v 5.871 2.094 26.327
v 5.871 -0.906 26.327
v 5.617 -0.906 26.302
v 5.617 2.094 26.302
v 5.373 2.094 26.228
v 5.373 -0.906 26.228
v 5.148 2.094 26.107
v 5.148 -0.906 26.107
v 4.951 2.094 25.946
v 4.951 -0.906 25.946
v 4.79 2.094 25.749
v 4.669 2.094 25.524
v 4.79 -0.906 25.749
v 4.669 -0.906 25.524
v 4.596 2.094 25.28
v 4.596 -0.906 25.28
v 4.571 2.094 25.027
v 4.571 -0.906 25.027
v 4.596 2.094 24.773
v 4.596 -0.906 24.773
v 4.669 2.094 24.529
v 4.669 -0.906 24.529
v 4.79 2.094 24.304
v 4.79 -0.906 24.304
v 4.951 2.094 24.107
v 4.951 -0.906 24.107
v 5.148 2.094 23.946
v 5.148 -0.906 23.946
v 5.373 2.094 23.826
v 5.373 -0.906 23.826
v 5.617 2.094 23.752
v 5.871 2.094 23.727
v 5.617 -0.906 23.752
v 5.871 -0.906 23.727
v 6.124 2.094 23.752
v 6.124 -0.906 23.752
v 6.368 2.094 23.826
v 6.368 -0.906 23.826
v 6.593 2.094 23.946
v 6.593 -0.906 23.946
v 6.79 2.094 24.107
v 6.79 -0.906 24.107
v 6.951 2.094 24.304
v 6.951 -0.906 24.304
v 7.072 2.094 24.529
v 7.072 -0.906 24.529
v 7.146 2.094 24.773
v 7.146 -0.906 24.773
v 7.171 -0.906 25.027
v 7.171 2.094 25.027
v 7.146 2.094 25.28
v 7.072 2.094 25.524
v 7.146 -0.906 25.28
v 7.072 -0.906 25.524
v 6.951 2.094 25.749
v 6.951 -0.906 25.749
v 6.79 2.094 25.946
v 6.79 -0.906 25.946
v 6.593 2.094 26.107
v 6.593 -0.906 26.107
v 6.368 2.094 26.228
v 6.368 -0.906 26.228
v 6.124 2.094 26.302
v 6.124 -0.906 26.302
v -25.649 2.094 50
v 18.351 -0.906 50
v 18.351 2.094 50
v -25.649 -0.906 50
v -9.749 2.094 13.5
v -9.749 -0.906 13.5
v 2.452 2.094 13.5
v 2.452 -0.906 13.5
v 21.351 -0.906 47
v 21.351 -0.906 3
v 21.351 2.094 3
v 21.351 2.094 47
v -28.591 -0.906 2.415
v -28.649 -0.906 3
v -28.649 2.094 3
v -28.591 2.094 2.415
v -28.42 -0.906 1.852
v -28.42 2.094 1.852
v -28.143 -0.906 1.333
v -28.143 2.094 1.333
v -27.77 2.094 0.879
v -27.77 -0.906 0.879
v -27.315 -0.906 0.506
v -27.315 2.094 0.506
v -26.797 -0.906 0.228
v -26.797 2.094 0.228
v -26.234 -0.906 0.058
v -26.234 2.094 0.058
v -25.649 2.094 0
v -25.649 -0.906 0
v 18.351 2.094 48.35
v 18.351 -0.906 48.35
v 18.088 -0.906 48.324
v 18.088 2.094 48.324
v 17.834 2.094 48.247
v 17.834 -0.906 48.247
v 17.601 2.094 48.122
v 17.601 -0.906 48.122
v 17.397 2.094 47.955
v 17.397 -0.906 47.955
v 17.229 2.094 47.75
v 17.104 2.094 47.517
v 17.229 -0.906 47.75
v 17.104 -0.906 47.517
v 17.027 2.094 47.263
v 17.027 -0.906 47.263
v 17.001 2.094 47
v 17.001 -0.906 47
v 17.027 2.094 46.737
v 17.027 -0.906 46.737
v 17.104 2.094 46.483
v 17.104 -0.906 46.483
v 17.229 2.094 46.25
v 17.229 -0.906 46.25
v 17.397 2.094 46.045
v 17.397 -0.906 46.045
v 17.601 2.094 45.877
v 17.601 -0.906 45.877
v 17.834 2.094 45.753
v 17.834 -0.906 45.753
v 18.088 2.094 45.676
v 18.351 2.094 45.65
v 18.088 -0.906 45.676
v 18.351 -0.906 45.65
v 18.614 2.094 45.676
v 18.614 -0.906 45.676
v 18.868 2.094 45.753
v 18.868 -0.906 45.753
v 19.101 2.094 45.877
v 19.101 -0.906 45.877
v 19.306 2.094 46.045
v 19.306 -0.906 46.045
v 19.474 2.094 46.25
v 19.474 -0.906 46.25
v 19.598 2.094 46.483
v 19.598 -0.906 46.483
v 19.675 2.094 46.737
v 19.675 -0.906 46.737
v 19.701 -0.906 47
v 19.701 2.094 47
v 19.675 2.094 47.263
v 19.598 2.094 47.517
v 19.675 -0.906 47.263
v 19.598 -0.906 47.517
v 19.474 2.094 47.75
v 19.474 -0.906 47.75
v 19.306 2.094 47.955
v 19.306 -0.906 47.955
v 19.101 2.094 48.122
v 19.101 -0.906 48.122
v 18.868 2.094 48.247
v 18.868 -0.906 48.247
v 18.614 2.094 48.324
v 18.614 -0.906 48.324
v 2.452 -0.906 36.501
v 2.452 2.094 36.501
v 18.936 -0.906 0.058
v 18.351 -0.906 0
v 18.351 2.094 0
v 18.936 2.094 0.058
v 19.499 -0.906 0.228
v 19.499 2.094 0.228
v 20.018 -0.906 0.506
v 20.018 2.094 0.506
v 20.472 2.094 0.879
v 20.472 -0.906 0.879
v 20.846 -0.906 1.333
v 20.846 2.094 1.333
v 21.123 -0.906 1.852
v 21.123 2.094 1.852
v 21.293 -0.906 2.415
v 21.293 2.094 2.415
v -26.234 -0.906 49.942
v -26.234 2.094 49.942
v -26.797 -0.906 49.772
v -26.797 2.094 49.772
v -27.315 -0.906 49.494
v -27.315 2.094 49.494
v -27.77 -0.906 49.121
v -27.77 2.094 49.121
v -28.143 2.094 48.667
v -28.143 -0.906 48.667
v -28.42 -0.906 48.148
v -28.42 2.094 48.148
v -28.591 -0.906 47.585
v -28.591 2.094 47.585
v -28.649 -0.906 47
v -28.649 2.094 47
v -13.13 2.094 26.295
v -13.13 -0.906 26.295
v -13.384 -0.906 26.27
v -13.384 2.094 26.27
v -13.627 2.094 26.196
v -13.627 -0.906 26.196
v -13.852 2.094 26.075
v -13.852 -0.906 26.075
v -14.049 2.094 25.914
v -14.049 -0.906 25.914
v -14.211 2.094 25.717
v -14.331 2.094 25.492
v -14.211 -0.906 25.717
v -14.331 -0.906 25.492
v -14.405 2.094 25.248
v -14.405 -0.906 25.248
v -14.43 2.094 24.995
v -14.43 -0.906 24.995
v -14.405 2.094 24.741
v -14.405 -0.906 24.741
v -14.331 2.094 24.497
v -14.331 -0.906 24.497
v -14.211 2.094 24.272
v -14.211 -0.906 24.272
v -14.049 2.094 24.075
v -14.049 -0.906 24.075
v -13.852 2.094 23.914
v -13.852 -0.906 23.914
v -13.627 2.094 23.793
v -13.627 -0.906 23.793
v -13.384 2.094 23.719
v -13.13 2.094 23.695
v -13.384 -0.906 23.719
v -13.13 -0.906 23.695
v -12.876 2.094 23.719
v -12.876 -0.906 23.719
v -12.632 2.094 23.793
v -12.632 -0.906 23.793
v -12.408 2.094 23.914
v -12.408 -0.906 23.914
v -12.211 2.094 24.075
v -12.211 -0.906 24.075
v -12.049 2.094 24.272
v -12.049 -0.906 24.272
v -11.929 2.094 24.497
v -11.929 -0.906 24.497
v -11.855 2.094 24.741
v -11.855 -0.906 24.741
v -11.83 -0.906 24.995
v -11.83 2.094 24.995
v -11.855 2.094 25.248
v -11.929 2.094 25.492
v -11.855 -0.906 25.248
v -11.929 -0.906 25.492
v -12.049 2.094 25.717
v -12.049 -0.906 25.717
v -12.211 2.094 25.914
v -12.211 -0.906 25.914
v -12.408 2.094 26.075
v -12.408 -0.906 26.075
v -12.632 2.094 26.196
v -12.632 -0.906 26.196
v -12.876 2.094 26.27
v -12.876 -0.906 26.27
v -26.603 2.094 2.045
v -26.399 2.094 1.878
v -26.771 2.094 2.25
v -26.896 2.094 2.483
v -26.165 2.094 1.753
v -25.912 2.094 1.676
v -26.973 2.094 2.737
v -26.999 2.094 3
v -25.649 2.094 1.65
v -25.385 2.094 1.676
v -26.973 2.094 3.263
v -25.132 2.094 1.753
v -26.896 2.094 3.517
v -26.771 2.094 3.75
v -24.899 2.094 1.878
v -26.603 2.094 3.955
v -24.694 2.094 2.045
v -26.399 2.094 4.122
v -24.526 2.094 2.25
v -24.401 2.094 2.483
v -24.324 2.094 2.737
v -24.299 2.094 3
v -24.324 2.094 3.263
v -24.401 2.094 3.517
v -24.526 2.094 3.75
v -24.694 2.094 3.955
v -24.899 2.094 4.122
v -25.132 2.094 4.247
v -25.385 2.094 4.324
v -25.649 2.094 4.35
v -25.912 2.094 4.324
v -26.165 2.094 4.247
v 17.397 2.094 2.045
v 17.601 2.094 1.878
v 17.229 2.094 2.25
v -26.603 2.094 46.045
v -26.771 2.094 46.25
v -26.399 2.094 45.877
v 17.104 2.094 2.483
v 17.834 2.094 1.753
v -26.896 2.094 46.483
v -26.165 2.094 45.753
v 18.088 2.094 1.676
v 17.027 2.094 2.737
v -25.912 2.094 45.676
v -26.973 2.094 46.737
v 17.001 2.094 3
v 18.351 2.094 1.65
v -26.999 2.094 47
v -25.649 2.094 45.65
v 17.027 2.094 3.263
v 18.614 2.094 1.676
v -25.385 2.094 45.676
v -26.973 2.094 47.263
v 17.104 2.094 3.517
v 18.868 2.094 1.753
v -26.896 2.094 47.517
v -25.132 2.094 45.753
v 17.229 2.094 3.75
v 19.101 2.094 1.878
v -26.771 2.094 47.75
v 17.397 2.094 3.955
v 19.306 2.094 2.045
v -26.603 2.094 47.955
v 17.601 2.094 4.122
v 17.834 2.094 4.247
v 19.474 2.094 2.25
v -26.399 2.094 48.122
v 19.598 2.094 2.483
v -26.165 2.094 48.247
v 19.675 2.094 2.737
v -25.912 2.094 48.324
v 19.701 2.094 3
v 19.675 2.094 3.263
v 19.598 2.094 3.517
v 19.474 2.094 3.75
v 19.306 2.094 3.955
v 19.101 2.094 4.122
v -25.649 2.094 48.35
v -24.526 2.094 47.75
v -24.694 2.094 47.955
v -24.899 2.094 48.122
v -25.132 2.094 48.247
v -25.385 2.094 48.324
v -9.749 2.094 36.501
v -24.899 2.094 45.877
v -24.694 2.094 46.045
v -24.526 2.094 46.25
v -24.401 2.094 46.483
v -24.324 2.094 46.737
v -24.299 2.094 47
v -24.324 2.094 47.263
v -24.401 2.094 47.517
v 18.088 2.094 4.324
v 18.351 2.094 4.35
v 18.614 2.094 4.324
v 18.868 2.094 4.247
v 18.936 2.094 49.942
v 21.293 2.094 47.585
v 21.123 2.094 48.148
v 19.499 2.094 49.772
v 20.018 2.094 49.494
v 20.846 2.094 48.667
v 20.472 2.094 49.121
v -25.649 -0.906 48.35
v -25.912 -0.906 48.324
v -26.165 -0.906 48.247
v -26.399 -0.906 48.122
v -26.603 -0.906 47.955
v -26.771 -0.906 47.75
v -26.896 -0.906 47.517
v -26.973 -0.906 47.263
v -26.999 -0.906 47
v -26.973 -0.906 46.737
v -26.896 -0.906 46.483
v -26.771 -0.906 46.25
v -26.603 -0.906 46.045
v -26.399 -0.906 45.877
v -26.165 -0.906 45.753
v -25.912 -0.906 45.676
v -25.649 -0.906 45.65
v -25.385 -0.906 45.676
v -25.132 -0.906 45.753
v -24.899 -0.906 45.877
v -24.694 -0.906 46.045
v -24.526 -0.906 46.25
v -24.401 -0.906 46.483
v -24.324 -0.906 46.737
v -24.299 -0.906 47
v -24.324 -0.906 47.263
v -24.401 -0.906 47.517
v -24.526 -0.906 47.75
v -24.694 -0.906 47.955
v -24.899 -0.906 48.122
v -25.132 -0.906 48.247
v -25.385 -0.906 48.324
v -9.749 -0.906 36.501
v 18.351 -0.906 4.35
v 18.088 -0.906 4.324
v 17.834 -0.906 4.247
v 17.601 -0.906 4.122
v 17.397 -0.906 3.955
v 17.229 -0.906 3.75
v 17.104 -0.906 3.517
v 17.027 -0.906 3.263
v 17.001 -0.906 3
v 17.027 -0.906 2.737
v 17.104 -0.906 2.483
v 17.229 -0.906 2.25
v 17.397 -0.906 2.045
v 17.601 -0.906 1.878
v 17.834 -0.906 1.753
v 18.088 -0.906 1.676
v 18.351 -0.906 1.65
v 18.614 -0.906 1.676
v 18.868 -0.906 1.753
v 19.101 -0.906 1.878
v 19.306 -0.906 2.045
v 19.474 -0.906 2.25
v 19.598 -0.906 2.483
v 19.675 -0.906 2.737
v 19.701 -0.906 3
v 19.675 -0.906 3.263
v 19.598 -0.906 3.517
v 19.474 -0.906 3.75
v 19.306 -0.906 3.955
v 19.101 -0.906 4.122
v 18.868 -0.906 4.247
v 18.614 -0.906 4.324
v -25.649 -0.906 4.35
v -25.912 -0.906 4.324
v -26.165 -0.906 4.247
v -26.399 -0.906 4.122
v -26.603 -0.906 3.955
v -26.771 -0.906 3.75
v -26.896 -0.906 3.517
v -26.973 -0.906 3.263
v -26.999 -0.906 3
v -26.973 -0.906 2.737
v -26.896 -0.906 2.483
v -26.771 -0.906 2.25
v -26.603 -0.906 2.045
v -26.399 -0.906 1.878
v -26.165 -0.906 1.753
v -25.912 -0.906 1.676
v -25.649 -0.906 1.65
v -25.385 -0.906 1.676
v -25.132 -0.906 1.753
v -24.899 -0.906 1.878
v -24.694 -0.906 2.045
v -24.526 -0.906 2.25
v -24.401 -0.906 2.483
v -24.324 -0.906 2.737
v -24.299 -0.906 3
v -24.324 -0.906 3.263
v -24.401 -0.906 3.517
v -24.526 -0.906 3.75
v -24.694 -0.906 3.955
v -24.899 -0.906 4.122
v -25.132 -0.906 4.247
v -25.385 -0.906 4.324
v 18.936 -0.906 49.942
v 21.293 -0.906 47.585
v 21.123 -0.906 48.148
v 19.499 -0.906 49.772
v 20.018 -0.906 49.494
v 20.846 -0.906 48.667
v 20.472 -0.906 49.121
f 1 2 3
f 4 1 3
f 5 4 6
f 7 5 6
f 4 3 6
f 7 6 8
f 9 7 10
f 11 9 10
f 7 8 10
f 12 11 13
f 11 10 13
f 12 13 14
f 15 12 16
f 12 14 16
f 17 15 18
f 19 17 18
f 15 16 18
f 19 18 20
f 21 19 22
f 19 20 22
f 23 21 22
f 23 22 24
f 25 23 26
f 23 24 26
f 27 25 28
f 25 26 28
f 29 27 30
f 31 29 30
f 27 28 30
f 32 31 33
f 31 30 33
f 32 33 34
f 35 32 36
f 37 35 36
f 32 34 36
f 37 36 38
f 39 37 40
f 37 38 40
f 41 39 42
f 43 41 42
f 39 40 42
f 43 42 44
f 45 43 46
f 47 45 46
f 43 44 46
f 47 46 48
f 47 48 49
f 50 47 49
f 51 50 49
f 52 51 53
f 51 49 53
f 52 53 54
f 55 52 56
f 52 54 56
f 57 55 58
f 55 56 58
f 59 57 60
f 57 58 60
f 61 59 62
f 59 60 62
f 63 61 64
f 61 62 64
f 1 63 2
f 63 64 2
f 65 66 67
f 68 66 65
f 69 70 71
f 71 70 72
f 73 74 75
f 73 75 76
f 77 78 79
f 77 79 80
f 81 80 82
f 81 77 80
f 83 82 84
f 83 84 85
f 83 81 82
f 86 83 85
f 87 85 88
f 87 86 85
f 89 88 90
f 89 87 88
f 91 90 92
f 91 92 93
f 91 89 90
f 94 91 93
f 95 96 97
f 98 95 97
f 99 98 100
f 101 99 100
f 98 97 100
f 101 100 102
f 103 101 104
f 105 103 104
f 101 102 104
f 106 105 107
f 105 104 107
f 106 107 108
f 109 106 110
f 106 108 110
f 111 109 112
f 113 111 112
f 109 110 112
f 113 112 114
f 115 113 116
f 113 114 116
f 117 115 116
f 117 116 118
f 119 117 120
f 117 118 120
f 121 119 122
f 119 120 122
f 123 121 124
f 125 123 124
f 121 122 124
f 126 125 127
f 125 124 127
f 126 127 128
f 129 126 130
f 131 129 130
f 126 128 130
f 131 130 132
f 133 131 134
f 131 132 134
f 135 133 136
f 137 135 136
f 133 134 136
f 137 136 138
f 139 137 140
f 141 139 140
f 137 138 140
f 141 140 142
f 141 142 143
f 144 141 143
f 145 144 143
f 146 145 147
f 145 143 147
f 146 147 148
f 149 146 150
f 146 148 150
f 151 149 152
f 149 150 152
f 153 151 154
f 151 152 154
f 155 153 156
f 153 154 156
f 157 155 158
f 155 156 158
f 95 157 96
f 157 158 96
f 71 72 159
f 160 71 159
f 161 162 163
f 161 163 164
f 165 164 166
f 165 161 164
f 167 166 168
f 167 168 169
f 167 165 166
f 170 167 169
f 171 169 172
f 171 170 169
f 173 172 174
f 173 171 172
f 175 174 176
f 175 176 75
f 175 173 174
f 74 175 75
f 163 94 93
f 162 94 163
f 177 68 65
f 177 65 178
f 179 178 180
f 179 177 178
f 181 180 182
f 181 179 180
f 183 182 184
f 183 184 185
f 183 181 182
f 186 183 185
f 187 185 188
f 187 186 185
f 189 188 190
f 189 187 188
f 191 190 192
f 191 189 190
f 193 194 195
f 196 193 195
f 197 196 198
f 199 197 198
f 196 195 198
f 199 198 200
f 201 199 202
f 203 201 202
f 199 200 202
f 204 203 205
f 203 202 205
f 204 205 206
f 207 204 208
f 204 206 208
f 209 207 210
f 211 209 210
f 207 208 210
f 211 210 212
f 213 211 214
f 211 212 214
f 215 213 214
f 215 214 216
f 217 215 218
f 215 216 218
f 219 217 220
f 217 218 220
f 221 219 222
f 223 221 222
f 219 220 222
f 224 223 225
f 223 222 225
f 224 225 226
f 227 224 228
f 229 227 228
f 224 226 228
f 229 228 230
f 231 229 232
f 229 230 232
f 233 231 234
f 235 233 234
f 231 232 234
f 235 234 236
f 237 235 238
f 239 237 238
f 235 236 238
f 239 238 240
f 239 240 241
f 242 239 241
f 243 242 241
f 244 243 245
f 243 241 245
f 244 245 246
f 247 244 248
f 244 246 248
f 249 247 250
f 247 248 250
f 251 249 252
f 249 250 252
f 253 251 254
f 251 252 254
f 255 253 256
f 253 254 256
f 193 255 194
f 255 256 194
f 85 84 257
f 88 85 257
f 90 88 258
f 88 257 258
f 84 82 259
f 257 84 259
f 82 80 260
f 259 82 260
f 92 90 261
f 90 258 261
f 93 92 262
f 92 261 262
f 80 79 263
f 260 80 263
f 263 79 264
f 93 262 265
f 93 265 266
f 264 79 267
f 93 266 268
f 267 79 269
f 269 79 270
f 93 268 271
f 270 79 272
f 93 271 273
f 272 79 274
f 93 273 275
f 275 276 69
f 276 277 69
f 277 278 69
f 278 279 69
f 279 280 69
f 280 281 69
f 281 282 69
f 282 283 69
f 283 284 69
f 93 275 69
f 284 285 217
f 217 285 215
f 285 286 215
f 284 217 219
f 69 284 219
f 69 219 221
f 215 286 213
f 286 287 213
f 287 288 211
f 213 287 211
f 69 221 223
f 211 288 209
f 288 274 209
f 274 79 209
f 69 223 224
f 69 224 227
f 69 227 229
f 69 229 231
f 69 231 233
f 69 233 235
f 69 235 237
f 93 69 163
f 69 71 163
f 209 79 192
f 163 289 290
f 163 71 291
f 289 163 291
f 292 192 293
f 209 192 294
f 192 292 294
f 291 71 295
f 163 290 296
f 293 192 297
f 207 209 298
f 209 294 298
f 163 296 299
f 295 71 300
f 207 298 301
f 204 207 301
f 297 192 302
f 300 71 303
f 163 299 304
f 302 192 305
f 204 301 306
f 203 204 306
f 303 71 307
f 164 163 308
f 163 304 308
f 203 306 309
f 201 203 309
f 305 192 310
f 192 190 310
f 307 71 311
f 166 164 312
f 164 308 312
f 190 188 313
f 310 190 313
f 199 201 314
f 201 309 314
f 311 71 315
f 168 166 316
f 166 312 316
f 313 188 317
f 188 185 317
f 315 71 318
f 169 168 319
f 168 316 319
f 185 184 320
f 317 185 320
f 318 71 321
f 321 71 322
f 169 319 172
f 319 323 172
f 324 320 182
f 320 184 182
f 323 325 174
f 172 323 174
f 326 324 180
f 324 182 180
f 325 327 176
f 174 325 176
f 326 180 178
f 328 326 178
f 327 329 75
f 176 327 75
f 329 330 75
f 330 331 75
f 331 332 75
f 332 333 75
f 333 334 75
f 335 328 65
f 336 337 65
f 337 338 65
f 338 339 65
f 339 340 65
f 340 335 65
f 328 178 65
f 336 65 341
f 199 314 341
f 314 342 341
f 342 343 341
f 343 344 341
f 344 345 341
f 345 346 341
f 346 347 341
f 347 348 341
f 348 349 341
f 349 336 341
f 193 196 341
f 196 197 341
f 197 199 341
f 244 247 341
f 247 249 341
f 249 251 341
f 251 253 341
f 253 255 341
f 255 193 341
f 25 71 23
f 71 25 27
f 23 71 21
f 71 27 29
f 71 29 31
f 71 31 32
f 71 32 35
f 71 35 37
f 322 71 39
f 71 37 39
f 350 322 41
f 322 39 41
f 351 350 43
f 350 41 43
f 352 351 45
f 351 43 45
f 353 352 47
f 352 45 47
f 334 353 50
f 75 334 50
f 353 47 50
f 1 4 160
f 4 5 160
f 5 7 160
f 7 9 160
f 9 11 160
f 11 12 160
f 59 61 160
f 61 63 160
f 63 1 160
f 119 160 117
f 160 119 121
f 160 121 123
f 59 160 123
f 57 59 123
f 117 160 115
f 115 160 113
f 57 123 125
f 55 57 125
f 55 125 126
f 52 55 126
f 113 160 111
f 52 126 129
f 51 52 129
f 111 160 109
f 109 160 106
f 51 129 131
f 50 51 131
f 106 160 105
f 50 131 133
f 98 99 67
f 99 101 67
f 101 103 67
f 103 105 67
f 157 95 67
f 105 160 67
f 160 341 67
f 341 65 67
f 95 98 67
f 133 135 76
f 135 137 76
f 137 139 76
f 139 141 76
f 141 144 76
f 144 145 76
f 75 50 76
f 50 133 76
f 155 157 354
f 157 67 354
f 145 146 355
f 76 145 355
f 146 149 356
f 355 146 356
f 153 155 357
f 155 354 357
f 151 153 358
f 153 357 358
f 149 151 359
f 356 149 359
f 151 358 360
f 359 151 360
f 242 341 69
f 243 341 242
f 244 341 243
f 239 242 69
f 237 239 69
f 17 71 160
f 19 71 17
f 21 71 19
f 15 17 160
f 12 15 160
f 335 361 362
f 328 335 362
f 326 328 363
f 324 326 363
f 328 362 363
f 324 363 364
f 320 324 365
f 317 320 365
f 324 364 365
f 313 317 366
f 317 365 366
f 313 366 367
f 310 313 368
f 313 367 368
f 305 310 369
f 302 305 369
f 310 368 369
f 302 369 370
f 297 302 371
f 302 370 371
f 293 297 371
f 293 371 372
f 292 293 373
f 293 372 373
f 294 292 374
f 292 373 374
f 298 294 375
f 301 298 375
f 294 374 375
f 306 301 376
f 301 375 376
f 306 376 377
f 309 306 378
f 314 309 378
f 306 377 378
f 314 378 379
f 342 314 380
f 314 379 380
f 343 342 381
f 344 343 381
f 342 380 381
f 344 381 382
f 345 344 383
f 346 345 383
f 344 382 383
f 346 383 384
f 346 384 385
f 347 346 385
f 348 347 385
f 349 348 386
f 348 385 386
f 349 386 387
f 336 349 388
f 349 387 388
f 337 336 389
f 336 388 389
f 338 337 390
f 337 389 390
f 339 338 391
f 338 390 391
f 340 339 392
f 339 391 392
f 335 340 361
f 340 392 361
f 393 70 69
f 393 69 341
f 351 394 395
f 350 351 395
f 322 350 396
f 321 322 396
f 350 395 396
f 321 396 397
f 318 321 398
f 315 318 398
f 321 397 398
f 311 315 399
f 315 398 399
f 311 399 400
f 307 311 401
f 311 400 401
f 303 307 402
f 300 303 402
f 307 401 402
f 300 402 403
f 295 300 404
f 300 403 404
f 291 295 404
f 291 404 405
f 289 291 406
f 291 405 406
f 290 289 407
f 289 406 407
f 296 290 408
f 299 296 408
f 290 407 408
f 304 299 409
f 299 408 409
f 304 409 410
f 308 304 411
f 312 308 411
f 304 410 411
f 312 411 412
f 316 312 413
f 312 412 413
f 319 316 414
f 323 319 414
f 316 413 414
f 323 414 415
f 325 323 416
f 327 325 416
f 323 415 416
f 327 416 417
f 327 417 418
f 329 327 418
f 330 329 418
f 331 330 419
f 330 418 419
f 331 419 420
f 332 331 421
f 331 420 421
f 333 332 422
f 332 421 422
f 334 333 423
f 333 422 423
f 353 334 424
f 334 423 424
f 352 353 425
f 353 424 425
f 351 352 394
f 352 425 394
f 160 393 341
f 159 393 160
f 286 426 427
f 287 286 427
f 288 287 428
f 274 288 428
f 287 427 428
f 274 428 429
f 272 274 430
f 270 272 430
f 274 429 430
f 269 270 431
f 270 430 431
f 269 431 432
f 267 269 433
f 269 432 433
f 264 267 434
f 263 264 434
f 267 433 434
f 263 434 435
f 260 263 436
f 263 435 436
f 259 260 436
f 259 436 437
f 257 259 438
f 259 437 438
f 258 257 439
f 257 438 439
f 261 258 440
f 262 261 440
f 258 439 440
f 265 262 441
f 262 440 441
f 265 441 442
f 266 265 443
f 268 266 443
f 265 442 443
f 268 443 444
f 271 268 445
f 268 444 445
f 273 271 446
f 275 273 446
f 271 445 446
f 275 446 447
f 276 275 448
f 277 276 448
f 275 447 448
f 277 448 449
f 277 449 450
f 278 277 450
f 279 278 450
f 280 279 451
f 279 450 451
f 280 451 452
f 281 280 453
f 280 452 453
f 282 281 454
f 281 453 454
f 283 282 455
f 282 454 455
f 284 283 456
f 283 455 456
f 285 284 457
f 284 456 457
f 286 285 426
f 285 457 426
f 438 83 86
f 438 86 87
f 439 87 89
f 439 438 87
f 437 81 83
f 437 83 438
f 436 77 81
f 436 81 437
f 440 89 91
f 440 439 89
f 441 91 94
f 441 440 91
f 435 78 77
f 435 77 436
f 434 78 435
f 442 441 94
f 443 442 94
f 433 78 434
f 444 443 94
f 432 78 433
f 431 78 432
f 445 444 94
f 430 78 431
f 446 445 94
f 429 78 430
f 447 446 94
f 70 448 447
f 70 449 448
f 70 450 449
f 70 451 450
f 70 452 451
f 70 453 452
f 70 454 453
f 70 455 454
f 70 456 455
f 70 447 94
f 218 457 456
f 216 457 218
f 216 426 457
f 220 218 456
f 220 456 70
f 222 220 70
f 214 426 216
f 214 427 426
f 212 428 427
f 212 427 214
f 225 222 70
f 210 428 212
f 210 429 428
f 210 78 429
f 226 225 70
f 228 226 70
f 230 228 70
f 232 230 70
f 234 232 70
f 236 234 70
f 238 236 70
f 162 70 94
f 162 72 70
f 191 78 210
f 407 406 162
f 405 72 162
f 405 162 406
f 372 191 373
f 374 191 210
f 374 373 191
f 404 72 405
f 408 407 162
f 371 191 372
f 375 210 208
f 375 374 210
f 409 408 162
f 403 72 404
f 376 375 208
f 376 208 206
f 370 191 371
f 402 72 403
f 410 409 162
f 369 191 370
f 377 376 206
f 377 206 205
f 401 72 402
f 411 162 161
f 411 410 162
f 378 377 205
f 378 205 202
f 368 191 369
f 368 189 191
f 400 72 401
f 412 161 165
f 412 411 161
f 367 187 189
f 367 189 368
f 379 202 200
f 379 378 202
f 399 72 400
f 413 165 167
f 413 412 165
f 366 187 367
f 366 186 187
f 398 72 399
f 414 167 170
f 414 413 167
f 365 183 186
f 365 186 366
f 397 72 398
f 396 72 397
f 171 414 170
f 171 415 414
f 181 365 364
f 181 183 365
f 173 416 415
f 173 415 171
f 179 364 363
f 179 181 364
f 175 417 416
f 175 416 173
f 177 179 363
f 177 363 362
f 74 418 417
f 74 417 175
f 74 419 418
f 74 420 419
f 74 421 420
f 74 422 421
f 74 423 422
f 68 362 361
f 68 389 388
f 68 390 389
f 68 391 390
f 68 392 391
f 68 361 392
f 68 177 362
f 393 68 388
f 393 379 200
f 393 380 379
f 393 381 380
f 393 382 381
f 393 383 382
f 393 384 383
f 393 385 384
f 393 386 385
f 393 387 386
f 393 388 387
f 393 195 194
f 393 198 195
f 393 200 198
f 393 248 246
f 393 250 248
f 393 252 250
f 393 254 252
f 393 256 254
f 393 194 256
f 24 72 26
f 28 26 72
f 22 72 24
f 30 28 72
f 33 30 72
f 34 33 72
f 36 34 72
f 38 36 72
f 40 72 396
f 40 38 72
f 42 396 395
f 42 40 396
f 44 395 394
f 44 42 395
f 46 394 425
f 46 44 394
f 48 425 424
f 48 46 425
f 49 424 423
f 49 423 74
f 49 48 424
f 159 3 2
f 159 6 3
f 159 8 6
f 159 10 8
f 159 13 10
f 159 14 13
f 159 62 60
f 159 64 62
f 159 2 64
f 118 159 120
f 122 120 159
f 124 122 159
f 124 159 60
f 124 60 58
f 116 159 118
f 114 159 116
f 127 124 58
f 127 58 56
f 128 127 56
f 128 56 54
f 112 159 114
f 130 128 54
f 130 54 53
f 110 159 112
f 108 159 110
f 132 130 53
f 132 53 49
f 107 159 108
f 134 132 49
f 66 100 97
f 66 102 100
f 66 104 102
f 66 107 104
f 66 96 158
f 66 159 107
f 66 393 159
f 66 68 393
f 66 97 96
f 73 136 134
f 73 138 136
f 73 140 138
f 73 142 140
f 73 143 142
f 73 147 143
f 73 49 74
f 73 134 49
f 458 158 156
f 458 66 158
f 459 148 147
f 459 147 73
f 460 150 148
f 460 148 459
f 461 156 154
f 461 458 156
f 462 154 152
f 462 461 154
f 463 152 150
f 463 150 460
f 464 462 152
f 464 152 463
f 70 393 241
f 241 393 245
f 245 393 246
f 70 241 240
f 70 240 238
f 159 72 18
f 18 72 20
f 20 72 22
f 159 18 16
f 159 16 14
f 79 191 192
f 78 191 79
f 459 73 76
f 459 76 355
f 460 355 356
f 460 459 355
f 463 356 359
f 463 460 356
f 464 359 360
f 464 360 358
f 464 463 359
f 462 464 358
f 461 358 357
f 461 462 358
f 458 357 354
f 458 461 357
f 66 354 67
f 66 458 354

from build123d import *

# Parameters (mm, degrees)
SKETCH_1_R      = 1.35
SKETCH_1_R_2    = 1.3
SKETCH_1_W      = 12.200420097
SKETCH_1_H      = 23.000703054
EXTRUDE_1_DEPTH = 3


with BuildPart() as part:
    # 草图1 → 凸台-拉伸1 (new body)
    with BuildSketch(Plane.XZ.offset(0.906223555)):
        with BuildLine():
            Line((-25.648543234, 0), (18.351102305, 0))
            ThreePointArc((18.351102305, 0), (20.472422649, 0.878679656), (21.351102305, 3))
            Line((21.351102305, 3), (21.351102305, 46.999948986))
            ThreePointArc((21.351102305, 46.999948986), (20.472422649, 49.12126933), (18.351102305, 49.999948986))
            Line((18.351102305, 49.999948986), (-25.648543234, 49.999948986))
            ThreePointArc((-25.648543234, 49.999948986), (-27.769863578, 49.12126933), (-28.648543234, 46.999948986))
            Line((-28.648543234, 46.999948986), (-28.648543234, 3))
            ThreePointArc((-28.648543234, 3), (-27.769863578, 0.878679656), (-25.648543234, 0))
        make_face()
        with Locations(Location((18.351102305, 46.999948986, 0), (0, 0, 90))):
            Circle(SKETCH_1_R, mode=Mode.SUBTRACT)
        with Locations(Location((-25.648543234, 3, 0), (0, 0, 90))):
            Circle(SKETCH_1_R, mode=Mode.SUBTRACT)
        with Locations(Location((-25.648543234, 46.999948986, 0), (0, 0, 90))):
            Circle(SKETCH_1_R, mode=Mode.SUBTRACT)
        with Locations(Location((18.351102305, 3, 0), (0, 0, 90))):
            Circle(SKETCH_1_R, mode=Mode.SUBTRACT)
        with Locations(Location((5.870533839, 25.026548182, 0), (0, 0, 90))):
            Circle(SKETCH_1_R_2, mode=Mode.SUBTRACT)
        with Locations(Location((-13.129904617, 24.994501462, 0), (0, 0, 90))):
            Circle(SKETCH_1_R_2, mode=Mode.SUBTRACT)
        with Locations((-3.648510984, 25.000507943)):
            Rectangle(SKETCH_1_W, SKETCH_1_H, mode=Mode.SUBTRACT)
    extrude(amount=-EXTRUDE_1_DEPTH)


solid = part.part
